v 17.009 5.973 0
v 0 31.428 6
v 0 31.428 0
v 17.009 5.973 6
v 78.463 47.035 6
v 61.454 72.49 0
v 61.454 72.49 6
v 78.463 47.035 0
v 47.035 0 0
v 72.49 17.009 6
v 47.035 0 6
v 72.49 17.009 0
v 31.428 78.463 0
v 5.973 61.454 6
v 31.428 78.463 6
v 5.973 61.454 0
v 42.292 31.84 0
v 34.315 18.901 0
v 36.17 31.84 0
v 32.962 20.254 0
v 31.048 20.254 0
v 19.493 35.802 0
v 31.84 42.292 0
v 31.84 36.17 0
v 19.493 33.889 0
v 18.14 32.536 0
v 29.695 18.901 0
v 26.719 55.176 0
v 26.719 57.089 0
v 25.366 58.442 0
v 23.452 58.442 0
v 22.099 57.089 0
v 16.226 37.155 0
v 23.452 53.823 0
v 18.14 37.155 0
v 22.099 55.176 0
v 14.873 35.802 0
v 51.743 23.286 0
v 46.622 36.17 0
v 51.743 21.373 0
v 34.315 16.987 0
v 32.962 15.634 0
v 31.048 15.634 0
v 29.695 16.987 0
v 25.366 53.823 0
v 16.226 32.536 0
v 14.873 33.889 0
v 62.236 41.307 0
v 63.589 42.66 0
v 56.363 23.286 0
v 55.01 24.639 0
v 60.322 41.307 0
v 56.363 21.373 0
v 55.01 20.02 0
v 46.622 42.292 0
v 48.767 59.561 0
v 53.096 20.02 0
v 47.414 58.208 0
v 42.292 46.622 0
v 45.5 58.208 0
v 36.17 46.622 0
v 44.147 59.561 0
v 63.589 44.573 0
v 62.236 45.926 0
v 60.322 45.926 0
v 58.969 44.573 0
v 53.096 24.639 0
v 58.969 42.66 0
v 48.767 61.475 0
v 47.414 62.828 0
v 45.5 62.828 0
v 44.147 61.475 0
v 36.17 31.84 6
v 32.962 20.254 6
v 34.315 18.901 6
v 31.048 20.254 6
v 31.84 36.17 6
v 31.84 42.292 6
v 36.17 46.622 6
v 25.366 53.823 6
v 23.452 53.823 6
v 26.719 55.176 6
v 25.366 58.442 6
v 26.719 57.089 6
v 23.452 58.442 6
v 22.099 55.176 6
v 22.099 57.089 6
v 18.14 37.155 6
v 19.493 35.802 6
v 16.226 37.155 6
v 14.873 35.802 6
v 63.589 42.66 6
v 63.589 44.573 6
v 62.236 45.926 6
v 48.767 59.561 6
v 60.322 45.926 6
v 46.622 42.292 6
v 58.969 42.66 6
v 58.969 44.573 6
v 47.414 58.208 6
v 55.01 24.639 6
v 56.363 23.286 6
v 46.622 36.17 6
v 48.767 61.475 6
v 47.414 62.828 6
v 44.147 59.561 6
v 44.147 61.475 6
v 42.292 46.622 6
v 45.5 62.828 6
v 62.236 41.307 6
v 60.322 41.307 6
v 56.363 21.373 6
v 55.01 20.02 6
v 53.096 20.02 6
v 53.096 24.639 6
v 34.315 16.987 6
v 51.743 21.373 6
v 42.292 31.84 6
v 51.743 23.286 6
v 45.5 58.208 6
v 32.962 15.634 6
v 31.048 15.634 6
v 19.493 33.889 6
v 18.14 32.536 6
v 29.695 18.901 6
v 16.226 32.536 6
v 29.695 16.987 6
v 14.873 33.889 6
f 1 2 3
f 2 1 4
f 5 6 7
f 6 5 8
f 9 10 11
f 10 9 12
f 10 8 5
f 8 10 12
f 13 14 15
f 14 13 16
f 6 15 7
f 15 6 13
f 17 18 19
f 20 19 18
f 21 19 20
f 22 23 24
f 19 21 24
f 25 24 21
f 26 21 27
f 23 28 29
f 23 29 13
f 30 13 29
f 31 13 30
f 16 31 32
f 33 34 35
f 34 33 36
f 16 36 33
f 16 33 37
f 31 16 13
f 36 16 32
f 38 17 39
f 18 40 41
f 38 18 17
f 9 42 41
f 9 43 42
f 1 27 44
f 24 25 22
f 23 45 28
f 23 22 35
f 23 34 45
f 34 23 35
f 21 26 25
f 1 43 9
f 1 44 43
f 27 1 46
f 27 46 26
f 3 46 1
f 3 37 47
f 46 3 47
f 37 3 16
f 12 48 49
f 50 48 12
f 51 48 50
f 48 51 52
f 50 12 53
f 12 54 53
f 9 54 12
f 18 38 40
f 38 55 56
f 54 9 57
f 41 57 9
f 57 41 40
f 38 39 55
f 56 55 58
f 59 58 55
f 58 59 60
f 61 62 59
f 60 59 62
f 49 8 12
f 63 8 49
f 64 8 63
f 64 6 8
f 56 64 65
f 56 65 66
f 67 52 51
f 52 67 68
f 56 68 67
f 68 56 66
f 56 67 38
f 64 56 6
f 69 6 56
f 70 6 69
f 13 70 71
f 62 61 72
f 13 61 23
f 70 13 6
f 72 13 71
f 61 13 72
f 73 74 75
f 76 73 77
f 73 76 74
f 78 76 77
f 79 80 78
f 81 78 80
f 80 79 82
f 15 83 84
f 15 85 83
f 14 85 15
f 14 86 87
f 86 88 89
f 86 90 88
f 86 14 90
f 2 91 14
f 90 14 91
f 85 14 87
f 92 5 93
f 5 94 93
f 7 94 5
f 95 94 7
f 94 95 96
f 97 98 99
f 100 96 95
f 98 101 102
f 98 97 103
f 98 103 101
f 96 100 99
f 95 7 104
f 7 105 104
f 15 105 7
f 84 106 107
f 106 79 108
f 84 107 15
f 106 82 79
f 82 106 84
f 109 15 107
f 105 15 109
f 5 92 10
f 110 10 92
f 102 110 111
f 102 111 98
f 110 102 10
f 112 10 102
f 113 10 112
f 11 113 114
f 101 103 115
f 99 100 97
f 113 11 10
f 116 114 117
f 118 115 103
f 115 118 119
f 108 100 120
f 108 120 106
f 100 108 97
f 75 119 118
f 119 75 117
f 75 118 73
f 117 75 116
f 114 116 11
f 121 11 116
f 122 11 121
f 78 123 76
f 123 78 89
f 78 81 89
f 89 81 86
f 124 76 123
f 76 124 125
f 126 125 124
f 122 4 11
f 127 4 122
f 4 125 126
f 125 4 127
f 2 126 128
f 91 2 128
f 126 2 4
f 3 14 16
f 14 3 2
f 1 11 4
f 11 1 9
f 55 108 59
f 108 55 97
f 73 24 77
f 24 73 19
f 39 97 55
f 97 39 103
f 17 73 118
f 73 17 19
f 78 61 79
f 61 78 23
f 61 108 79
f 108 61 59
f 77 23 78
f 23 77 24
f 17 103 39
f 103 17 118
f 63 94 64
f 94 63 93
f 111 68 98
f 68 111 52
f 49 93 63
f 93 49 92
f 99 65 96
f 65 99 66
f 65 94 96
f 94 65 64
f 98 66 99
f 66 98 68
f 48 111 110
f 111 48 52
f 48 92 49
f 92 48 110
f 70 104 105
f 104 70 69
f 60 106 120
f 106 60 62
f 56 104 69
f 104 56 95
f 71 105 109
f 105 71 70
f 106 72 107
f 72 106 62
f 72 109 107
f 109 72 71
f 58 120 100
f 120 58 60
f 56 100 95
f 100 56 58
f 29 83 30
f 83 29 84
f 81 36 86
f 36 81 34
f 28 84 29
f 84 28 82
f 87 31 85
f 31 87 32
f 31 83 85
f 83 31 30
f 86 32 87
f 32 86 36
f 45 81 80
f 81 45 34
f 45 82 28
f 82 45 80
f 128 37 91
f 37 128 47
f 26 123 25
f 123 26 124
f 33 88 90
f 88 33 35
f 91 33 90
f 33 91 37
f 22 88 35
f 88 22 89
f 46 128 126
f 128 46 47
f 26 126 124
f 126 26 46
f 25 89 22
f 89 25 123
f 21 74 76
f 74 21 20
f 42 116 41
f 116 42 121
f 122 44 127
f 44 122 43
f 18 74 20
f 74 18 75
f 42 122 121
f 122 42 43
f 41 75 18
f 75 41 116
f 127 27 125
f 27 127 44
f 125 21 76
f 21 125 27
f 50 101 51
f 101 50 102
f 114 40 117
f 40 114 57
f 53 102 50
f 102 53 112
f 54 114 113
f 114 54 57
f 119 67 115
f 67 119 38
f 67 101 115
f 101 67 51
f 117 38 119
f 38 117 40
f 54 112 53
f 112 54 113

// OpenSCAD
$fn = 32;

// ----------------------------------------------------------------------
// Polygon plate: 8-gon R40, 6 bolt windows
// ----------------------------------------------------------------------

// --- parameters (mm) ---
sides = 8;                // number of polygon sides
plate_r = 40;             // circumscribed radius of the polygon
bore_r = 8;               // centre bore radius
bolts = 6;                // number of bolt windows
ring_r = 22.48;           // bolt-circle radius
bolt_r = 2.5;             // bolt window radius
plate_t = 6;              // plate thickness, Z (extrusion height)
fit_tol = 0.05;           // declared fit tolerance (prompt contract)
free_tol = 0.3;           // declared free tolerance (prompt contract)

plate_d = 2 * plate_r;  // circumscribed diameter
bore_d = 2 * bore_r;  // centre bore diameter
bolt_d = 2 * bolt_r;  // bolt window diameter
ring_d = 2 * ring_r;  // bolt-circle diameter

profile = [[78.463, 47.035], [61.454, 72.49], [31.428, 78.463], [5.973, 61.454], [0, 31.428], [17.009, 5.973], [47.035, 0], [72.49, 17.009]];  // primary outline, 8 points, counter clockwise
void_1 = [[46.622, 42.292], [42.292, 46.622], [36.17, 46.622], [31.84, 42.292], [31.84, 36.17], [36.17, 31.84], [42.292, 31.84], [46.622, 36.17]];  // centre bore, 8 points
void_2 = [[63.589, 44.573], [62.236, 45.926], [60.322, 45.926], [58.969, 44.573], [58.969, 42.66], [60.322, 41.307], [62.236, 41.307], [63.589, 42.66]];  // bolt window 1, 8 points
void_3 = [[48.767, 61.475], [47.414, 62.828], [45.5, 62.828], [44.147, 61.475], [44.147, 59.561], [45.5, 58.208], [47.414, 58.208], [48.767, 59.561]];  // bolt window 2, 8 points
void_4 = [[26.719, 57.089], [25.366, 58.442], [23.452, 58.442], [22.099, 57.089], [22.099, 55.176], [23.452, 53.823], [25.366, 53.823], [26.719, 55.176]];  // bolt window 3, 8 points
void_5 = [[19.493, 35.802], [18.14, 37.155], [16.226, 37.155], [14.873, 35.802], [14.873, 33.889], [16.226, 32.536], [18.14, 32.536], [19.493, 33.889]];  // bolt window 4, 8 points
void_6 = [[34.315, 18.901], [32.962, 20.254], [31.048, 20.254], [29.695, 18.901], [29.695, 16.987], [31.048, 15.634], [32.962, 15.634], [34.315, 16.987]];  // bolt window 5, 8 points
void_7 = [[56.363, 23.286], [55.01, 24.639], [53.096, 24.639], [51.743, 23.286], [51.743, 21.373], [53.096, 20.02], [55.01, 20.02], [56.363, 21.373]];  // bolt window 6, 8 points

// --- the one profile operation ---
difference() {
  linear_extrude(height = plate_t) polygon(points = profile);
  translate([0, 0, -1])
    linear_extrude(height = plate_t + 2) polygon(points = void_1);
  translate([0, 0, -1])
    linear_extrude(height = plate_t + 2) polygon(points = void_2);
  translate([0, 0, -1])
    linear_extrude(height = plate_t + 2) polygon(points = void_3);
  translate([0, 0, -1])
    linear_extrude(height = plate_t + 2) polygon(points = void_4);
  translate([0, 0, -1])
    linear_extrude(height = plate_t + 2) polygon(points = void_5);
  translate([0, 0, -1])
    linear_extrude(height = plate_t + 2) polygon(points = void_6);
  translate([0, 0, -1])
    linear_extrude(height = plate_t + 2) polygon(points = void_7);
}
